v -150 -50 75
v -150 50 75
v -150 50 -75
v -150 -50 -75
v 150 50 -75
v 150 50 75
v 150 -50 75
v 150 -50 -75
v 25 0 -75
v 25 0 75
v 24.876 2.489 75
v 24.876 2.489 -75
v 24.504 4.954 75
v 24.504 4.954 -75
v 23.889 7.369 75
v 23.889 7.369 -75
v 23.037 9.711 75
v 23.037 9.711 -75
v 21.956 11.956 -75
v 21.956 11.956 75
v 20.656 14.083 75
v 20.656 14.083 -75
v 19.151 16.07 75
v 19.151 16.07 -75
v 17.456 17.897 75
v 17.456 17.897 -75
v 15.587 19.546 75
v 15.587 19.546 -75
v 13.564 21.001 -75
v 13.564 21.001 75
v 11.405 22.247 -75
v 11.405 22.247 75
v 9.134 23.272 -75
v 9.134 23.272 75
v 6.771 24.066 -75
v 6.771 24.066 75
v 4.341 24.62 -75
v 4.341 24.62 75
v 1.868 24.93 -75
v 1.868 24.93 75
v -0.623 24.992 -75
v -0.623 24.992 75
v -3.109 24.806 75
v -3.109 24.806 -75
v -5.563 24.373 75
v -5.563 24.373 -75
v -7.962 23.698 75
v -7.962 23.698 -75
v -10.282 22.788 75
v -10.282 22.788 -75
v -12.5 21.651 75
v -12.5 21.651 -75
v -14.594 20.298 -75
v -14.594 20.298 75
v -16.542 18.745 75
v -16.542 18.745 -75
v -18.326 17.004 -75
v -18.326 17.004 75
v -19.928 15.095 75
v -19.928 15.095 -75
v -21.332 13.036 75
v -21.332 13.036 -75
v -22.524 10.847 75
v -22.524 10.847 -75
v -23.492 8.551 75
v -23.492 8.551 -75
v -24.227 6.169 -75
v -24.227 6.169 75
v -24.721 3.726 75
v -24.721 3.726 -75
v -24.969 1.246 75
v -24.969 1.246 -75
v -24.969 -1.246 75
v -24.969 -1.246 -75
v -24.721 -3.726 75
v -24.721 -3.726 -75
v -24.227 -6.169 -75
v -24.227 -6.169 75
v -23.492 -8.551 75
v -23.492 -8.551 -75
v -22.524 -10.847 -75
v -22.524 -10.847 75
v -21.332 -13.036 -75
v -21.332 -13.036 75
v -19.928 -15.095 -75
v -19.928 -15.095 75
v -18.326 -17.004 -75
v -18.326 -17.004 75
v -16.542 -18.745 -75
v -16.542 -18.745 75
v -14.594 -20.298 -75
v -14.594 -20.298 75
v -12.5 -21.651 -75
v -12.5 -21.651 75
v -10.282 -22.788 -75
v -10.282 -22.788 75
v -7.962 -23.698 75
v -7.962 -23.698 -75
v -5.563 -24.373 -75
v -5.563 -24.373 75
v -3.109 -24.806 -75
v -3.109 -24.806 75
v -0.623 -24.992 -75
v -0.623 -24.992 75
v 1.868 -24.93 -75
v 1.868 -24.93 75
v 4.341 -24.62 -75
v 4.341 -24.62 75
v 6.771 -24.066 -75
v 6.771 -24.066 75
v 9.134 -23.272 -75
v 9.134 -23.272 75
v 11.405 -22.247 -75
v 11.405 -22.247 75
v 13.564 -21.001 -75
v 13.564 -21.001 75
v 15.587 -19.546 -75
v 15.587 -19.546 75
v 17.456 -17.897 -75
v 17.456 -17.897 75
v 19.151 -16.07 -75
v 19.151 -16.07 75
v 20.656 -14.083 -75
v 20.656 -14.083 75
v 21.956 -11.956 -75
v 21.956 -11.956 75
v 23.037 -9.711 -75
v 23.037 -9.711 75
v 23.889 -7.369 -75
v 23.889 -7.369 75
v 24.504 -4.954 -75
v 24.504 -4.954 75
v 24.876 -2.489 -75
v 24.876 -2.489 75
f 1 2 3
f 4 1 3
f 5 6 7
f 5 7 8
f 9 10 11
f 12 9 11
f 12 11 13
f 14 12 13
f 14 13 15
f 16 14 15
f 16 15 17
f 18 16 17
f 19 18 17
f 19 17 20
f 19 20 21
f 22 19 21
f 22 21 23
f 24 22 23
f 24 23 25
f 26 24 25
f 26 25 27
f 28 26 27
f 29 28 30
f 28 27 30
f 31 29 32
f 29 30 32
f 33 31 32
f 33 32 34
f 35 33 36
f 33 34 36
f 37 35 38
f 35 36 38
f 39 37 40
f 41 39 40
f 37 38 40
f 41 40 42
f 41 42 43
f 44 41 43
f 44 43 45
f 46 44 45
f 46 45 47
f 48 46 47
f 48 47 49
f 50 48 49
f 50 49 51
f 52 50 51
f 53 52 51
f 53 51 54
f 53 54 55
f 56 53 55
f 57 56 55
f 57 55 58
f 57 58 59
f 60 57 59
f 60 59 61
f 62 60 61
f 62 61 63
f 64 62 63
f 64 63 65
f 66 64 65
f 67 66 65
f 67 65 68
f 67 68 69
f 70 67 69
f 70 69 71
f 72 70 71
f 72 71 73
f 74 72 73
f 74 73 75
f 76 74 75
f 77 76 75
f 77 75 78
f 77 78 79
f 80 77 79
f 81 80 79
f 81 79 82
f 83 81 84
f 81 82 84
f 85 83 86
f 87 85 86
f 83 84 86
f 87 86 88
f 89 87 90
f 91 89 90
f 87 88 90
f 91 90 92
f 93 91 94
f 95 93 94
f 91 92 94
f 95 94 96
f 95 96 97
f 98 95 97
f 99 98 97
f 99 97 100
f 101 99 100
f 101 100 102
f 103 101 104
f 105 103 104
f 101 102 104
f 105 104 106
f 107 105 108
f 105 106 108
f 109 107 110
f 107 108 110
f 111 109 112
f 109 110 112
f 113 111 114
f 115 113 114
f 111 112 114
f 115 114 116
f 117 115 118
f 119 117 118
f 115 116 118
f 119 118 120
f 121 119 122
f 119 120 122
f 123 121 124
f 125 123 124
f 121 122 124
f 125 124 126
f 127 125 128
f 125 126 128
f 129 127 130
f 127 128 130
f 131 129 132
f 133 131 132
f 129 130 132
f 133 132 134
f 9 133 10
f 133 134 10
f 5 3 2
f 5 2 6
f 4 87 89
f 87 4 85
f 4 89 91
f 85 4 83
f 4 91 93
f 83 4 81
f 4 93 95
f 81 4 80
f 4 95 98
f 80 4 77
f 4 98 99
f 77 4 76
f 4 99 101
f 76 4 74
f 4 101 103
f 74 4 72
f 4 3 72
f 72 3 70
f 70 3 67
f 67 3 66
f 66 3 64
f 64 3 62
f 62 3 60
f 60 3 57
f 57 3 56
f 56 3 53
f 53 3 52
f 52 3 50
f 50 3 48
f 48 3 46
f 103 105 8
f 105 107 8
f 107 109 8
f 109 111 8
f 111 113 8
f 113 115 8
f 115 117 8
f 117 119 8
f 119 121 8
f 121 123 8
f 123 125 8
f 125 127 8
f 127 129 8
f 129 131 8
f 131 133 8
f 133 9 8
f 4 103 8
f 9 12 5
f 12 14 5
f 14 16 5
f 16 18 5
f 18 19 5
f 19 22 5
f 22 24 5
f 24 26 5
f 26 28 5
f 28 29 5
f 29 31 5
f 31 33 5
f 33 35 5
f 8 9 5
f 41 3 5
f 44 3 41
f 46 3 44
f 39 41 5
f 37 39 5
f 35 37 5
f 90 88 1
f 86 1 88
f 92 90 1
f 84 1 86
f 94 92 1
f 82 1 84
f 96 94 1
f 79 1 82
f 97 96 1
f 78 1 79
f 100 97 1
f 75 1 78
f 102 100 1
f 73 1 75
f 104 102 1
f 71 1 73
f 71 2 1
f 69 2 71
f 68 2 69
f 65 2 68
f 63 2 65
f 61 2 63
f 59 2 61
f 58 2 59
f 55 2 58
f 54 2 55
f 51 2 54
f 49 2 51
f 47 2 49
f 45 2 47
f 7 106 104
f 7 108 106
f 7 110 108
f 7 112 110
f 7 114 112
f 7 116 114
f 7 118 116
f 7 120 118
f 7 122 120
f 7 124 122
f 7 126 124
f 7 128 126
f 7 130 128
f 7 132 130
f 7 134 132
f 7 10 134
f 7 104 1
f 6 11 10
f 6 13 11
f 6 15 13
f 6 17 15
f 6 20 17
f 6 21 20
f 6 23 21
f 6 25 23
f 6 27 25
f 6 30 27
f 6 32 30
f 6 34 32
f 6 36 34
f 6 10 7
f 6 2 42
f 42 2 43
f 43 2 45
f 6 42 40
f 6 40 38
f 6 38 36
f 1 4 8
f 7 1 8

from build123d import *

# Parameters (mm, degrees)
SKETCH1_W           = 300
SKETCH1_H           = 150
BOSS_EXTRUDE1_DEPTH = 50
SKETCH2_R           = 25
CUT_EXTRUDE1_DEPTH  = 151


with BuildPart() as part:
    # Sketch1 → Boss-Extrude1 (new body, symmetric)
    with BuildSketch(Plane(origin=(0, 0, 0), x_dir=(1, 0, 0), z_dir=(0, 1, 0))):
        Rectangle(SKETCH1_W, SKETCH1_H)
    extrude(amount=BOSS_EXTRUDE1_DEPTH, both=True)

    # Sketch2 → Cut-Extrude1 (cut, through all)
    with BuildSketch(Plane.XY.offset(75)):
        Circle(SKETCH2_R)
    extrude(amount=-CUT_EXTRUDE1_DEPTH, mode=Mode.SUBTRACT)


solid = part.part
